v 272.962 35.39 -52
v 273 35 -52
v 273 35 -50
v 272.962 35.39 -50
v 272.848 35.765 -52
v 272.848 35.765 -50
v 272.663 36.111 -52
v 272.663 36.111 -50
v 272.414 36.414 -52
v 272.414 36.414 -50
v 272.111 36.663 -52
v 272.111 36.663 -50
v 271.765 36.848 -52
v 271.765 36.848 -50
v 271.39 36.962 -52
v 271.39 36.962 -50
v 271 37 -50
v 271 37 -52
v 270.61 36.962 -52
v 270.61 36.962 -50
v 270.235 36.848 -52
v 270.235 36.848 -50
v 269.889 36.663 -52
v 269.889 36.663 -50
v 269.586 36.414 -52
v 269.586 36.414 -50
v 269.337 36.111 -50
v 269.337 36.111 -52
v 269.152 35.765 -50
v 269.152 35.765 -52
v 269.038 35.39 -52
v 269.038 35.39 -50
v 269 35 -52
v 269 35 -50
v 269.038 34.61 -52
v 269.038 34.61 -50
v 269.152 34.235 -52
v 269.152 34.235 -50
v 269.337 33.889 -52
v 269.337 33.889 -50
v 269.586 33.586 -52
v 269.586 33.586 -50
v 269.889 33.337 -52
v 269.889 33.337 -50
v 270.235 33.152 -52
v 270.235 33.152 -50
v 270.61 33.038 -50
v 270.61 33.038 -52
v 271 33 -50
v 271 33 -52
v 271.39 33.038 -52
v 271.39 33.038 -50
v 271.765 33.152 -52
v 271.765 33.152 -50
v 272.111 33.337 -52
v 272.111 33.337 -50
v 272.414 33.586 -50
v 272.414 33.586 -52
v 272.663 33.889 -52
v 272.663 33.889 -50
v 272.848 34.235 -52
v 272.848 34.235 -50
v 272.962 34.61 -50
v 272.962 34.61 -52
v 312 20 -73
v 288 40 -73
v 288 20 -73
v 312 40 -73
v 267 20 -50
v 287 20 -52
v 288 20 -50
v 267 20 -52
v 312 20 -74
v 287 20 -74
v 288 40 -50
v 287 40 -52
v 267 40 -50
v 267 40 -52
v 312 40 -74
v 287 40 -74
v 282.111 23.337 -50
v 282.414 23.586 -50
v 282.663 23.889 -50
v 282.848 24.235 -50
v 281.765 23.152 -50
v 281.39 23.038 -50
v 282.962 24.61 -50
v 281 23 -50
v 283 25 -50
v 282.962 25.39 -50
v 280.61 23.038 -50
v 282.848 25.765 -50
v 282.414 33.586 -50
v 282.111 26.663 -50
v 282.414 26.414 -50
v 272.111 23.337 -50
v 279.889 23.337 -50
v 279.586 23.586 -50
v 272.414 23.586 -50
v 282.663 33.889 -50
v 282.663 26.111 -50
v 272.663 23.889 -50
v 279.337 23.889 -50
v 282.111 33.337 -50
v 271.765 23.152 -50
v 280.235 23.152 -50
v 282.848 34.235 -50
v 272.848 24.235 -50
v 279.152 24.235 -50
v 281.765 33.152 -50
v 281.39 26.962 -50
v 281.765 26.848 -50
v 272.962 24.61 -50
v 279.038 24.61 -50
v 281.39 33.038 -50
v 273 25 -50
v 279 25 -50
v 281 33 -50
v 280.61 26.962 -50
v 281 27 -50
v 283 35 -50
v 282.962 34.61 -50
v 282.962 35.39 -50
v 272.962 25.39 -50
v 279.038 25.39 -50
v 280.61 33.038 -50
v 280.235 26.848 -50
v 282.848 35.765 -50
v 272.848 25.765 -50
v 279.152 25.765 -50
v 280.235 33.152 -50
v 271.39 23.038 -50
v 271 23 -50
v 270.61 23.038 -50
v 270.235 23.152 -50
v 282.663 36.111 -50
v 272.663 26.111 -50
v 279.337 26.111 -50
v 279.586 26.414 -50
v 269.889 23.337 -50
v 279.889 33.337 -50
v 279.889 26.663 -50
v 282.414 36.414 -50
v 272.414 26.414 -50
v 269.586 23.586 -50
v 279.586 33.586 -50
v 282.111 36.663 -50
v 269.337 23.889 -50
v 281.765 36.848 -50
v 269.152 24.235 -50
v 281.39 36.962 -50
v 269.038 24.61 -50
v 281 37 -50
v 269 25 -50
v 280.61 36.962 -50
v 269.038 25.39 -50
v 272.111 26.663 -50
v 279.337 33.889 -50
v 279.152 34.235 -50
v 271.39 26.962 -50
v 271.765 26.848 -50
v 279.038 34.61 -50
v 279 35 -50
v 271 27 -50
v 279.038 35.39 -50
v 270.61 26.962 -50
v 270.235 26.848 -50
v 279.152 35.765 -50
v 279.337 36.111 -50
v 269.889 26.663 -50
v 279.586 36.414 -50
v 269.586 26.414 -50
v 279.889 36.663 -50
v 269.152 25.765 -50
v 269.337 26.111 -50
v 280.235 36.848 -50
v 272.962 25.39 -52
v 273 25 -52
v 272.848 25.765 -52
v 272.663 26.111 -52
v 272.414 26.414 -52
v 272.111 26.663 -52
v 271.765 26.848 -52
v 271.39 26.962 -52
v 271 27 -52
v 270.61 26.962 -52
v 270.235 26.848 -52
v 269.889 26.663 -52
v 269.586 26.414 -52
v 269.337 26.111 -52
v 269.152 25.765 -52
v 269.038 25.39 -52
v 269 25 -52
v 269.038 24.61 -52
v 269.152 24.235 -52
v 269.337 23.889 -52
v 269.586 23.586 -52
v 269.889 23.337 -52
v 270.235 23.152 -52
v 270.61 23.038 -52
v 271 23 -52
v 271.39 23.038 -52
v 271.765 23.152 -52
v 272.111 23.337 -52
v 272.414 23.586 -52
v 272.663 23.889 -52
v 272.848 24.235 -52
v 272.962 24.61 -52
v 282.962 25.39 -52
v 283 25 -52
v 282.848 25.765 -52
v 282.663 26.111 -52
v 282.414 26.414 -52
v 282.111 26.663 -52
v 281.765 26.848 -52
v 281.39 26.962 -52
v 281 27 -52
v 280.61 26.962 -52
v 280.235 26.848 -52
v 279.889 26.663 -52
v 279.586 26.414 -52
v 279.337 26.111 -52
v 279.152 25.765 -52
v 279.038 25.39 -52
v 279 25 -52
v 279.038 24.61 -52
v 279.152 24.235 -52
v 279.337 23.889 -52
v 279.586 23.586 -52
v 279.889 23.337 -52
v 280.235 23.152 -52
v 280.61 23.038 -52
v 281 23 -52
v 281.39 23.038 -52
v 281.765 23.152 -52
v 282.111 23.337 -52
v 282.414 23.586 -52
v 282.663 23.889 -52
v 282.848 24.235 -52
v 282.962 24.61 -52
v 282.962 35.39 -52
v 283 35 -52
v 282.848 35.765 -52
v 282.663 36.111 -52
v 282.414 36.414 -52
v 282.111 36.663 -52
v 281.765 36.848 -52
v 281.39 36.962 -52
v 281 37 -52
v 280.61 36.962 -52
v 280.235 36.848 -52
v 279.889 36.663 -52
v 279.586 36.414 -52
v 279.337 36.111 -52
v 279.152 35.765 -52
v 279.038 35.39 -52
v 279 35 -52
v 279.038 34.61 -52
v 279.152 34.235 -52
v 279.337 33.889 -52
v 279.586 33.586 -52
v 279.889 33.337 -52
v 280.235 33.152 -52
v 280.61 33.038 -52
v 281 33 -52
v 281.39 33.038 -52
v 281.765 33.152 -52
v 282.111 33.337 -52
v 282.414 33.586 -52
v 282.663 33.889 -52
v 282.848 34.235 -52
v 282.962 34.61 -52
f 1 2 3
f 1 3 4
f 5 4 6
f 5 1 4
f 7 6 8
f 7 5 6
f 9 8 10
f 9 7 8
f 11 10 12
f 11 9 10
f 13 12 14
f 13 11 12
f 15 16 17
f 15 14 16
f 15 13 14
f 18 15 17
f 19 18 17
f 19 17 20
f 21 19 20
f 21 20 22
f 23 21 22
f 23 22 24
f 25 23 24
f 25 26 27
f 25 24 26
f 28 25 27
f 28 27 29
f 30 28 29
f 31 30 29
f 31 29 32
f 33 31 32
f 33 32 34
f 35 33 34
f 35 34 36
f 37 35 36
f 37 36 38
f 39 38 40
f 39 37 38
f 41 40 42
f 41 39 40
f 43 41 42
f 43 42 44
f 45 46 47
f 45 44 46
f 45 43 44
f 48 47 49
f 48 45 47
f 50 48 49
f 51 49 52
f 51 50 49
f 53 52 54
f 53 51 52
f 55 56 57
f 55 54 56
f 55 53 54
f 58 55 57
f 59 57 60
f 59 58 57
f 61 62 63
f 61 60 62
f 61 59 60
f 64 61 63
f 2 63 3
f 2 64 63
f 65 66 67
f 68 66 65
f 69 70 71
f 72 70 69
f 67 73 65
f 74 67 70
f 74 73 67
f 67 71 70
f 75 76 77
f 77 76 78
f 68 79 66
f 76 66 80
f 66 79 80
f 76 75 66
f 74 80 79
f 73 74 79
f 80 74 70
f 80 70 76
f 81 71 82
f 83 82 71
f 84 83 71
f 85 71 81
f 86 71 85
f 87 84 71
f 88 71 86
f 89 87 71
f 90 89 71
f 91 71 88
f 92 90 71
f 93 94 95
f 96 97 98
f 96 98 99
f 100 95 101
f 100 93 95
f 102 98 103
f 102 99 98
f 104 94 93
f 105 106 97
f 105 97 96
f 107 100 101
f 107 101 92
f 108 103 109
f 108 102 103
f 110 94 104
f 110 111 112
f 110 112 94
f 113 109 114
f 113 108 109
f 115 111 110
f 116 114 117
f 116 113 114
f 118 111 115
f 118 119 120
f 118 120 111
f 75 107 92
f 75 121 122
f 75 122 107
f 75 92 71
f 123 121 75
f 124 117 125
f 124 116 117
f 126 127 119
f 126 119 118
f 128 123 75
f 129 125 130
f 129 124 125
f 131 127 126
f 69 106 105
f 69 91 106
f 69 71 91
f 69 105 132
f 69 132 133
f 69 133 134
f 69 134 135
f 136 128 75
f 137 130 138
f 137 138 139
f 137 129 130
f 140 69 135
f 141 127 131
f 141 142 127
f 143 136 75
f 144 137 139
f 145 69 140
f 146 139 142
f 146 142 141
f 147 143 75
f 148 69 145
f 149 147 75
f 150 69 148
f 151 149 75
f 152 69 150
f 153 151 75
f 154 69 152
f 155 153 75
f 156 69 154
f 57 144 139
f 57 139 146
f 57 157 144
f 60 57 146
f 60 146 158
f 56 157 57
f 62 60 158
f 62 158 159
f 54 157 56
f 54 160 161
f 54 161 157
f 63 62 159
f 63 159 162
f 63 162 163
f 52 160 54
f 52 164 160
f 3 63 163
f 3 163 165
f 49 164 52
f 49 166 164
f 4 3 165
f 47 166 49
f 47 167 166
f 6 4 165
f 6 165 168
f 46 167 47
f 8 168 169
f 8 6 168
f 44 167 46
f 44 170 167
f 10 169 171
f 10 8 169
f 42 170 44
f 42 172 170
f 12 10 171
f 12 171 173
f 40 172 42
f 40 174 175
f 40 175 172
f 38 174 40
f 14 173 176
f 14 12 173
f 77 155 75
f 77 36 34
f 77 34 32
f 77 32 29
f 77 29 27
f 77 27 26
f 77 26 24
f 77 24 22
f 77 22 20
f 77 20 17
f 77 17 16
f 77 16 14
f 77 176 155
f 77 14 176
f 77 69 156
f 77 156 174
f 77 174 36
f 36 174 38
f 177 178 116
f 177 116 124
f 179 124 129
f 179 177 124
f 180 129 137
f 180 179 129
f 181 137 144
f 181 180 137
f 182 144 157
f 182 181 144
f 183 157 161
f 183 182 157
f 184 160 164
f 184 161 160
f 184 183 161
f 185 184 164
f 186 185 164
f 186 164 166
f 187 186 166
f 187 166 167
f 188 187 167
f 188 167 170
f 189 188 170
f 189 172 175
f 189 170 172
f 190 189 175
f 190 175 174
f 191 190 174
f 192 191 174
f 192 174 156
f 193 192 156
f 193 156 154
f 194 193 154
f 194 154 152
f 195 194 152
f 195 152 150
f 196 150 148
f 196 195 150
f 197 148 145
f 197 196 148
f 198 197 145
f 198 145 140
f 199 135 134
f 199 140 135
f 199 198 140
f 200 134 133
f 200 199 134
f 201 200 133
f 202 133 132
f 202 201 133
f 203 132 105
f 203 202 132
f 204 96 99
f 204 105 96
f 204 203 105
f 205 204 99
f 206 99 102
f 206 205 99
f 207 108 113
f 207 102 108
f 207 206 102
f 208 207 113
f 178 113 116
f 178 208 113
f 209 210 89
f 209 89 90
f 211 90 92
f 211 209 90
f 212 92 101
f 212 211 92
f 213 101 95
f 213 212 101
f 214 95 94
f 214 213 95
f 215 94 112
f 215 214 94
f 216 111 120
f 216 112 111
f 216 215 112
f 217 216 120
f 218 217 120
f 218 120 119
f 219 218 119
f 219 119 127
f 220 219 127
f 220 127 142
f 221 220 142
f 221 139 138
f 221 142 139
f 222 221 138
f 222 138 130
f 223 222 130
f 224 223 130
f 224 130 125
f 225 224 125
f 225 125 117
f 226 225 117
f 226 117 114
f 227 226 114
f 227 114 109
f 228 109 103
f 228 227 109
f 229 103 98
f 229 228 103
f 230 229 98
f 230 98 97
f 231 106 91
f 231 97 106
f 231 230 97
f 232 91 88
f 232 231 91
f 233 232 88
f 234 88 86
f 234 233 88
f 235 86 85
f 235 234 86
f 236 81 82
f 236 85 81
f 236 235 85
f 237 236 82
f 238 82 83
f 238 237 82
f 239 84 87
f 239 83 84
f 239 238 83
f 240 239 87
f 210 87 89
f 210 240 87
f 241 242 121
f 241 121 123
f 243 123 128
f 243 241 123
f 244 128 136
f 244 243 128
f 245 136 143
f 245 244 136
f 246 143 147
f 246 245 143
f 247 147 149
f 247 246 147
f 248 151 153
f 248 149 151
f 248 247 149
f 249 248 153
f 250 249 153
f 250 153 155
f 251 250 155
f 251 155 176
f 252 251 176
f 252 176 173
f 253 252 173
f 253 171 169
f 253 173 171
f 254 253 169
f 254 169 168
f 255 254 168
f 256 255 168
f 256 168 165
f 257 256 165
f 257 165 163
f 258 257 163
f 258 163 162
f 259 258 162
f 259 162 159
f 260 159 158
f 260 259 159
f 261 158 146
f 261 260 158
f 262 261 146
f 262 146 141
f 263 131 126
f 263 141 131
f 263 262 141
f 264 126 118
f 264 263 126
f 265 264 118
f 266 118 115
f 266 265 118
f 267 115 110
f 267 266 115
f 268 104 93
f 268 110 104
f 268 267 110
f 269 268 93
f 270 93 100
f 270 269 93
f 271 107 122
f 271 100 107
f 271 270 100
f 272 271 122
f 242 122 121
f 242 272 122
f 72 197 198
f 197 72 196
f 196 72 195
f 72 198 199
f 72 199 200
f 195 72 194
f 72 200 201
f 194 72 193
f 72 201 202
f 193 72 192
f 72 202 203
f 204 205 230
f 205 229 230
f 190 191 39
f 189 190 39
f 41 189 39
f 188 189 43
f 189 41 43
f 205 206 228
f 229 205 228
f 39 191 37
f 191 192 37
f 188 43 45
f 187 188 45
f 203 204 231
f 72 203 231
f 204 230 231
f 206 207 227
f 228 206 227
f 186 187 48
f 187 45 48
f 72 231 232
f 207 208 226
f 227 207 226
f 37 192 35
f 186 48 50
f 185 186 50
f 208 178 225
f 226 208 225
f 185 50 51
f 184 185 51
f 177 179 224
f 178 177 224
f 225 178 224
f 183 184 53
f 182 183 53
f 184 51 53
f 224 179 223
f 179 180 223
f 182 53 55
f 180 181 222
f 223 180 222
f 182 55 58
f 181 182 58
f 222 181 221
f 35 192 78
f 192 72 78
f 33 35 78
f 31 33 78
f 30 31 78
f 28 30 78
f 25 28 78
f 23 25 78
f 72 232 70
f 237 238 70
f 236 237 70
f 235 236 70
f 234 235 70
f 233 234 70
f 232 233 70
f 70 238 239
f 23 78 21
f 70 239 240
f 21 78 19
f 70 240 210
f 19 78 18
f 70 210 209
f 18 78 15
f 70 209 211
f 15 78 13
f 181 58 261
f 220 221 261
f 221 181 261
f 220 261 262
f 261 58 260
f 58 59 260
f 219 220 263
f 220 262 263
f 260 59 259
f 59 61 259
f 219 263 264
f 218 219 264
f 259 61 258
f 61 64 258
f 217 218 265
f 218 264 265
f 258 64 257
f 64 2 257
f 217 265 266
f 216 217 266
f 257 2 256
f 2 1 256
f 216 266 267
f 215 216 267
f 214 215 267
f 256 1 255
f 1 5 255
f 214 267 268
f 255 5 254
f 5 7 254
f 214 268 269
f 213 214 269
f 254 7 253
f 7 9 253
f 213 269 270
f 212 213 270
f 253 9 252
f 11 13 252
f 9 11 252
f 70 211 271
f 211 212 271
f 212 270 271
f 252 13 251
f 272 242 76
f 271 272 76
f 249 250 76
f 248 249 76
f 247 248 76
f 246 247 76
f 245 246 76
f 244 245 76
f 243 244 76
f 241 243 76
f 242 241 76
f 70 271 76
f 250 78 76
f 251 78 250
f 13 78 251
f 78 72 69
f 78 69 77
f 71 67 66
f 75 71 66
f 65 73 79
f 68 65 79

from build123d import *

# Parameters (mm, degrees)
CYLINDER003_R     = 2
CYLINDER003_DEPTH = 10
BOX003_W          = 25
BOX003_H          = 20
BOX003_DEPTH      = 1
BOX002_W          = 20
BOX002_H          = 1
BOX002_DEPTH      = 23
BOX004_W          = 20
BOX004_H          = 20
BOX004_DEPTH      = 2


with BuildPart() as cylinder003:
    # Cylinder003 → Cylinder003 (new body)
    with BuildSketch(Plane(origin=(-7, 5, 20), x_dir=(1, 0, 0), z_dir=(0, 0, 1))):
        Circle(CYLINDER003_R)
    extrude(amount=CYLINDER003_DEPTH)


with BuildPart() as cylinder004:
    # Link base: copy of Cylinder003
    add(cylinder003.part)


with BuildPart() as cylinder004_1:
    # Link placement: moved
    add(cylinder004.part.moved(Location((-10, 0, 0))))


with BuildPart() as cylinder005:
    # Link001 base: copy of Cylinder003
    add(cylinder003.part)


with BuildPart() as cylinder005_1:
    # Link001 placement: moved
    add(cylinder005.part.moved(Location((-10, 10, 0))))


with BuildPart() as cylinder006:
    # Link002 base: copy of Cylinder003
    add(cylinder003.part)


with BuildPart() as cylinder006_1:
    # Link002 placement: moved
    add(cylinder006.part.moved(Location((0, 10, 0))))


with BuildPart() as fusion004:
    # Fusion004 base: copy of Cylinder003
    add(cylinder003.part)

    # Fusion004: union Cylinder004, Cylinder005, Cylinder006
    add(cylinder004_1.part)
    add(cylinder005_1.part)
    add(cylinder006_1.part)


with BuildPart() as s_abajo:
    # Box003 → Box003 (new body)
    with BuildSketch(Plane(origin=(287, 20, -74), x_dir=(1, 0, 0), z_dir=(0, 0, 1))):
        with Locations((12.5, 10)):
            Rectangle(BOX003_W, BOX003_H)
    extrude(amount=BOX003_DEPTH)


with BuildPart() as s_lateral:
    # Box002 → Box002 (new body)
    with BuildSketch(Plane(origin=(288, 20, -73), x_dir=(0, 1, 0), z_dir=(0, 0, 1))):
        with Locations((10, 0.5)):
            Rectangle(BOX002_W, BOX002_H)
    extrude(amount=BOX002_DEPTH)


with BuildPart() as soporte:
    # Box004 → Box004 (new body)
    with BuildSketch(Plane(origin=(267, 20, -52), x_dir=(1, 0, 0), z_dir=(0, 0, 1))):
        with Locations((10, 10)):
            Rectangle(BOX004_W, BOX004_H)
    extrude(amount=BOX004_DEPTH)

    # Fusion003: union s_abajo, s_lateral
    add(s_abajo.part)
    add(s_lateral.part)


with BuildPart() as soporte_1:
    # Fusion003 placement: moved
    add(soporte.part.moved(Location((-288, -20, 73))))

    # Cut001: cut Fusion004
    add(fusion004.part, mode=Mode.SUBTRACT)


with BuildPart() as soporte_2:
    # Cut001 placement: moved
    add(soporte_1.part.moved(Location((288, 20, -73))))


solid = soporte_2.part
